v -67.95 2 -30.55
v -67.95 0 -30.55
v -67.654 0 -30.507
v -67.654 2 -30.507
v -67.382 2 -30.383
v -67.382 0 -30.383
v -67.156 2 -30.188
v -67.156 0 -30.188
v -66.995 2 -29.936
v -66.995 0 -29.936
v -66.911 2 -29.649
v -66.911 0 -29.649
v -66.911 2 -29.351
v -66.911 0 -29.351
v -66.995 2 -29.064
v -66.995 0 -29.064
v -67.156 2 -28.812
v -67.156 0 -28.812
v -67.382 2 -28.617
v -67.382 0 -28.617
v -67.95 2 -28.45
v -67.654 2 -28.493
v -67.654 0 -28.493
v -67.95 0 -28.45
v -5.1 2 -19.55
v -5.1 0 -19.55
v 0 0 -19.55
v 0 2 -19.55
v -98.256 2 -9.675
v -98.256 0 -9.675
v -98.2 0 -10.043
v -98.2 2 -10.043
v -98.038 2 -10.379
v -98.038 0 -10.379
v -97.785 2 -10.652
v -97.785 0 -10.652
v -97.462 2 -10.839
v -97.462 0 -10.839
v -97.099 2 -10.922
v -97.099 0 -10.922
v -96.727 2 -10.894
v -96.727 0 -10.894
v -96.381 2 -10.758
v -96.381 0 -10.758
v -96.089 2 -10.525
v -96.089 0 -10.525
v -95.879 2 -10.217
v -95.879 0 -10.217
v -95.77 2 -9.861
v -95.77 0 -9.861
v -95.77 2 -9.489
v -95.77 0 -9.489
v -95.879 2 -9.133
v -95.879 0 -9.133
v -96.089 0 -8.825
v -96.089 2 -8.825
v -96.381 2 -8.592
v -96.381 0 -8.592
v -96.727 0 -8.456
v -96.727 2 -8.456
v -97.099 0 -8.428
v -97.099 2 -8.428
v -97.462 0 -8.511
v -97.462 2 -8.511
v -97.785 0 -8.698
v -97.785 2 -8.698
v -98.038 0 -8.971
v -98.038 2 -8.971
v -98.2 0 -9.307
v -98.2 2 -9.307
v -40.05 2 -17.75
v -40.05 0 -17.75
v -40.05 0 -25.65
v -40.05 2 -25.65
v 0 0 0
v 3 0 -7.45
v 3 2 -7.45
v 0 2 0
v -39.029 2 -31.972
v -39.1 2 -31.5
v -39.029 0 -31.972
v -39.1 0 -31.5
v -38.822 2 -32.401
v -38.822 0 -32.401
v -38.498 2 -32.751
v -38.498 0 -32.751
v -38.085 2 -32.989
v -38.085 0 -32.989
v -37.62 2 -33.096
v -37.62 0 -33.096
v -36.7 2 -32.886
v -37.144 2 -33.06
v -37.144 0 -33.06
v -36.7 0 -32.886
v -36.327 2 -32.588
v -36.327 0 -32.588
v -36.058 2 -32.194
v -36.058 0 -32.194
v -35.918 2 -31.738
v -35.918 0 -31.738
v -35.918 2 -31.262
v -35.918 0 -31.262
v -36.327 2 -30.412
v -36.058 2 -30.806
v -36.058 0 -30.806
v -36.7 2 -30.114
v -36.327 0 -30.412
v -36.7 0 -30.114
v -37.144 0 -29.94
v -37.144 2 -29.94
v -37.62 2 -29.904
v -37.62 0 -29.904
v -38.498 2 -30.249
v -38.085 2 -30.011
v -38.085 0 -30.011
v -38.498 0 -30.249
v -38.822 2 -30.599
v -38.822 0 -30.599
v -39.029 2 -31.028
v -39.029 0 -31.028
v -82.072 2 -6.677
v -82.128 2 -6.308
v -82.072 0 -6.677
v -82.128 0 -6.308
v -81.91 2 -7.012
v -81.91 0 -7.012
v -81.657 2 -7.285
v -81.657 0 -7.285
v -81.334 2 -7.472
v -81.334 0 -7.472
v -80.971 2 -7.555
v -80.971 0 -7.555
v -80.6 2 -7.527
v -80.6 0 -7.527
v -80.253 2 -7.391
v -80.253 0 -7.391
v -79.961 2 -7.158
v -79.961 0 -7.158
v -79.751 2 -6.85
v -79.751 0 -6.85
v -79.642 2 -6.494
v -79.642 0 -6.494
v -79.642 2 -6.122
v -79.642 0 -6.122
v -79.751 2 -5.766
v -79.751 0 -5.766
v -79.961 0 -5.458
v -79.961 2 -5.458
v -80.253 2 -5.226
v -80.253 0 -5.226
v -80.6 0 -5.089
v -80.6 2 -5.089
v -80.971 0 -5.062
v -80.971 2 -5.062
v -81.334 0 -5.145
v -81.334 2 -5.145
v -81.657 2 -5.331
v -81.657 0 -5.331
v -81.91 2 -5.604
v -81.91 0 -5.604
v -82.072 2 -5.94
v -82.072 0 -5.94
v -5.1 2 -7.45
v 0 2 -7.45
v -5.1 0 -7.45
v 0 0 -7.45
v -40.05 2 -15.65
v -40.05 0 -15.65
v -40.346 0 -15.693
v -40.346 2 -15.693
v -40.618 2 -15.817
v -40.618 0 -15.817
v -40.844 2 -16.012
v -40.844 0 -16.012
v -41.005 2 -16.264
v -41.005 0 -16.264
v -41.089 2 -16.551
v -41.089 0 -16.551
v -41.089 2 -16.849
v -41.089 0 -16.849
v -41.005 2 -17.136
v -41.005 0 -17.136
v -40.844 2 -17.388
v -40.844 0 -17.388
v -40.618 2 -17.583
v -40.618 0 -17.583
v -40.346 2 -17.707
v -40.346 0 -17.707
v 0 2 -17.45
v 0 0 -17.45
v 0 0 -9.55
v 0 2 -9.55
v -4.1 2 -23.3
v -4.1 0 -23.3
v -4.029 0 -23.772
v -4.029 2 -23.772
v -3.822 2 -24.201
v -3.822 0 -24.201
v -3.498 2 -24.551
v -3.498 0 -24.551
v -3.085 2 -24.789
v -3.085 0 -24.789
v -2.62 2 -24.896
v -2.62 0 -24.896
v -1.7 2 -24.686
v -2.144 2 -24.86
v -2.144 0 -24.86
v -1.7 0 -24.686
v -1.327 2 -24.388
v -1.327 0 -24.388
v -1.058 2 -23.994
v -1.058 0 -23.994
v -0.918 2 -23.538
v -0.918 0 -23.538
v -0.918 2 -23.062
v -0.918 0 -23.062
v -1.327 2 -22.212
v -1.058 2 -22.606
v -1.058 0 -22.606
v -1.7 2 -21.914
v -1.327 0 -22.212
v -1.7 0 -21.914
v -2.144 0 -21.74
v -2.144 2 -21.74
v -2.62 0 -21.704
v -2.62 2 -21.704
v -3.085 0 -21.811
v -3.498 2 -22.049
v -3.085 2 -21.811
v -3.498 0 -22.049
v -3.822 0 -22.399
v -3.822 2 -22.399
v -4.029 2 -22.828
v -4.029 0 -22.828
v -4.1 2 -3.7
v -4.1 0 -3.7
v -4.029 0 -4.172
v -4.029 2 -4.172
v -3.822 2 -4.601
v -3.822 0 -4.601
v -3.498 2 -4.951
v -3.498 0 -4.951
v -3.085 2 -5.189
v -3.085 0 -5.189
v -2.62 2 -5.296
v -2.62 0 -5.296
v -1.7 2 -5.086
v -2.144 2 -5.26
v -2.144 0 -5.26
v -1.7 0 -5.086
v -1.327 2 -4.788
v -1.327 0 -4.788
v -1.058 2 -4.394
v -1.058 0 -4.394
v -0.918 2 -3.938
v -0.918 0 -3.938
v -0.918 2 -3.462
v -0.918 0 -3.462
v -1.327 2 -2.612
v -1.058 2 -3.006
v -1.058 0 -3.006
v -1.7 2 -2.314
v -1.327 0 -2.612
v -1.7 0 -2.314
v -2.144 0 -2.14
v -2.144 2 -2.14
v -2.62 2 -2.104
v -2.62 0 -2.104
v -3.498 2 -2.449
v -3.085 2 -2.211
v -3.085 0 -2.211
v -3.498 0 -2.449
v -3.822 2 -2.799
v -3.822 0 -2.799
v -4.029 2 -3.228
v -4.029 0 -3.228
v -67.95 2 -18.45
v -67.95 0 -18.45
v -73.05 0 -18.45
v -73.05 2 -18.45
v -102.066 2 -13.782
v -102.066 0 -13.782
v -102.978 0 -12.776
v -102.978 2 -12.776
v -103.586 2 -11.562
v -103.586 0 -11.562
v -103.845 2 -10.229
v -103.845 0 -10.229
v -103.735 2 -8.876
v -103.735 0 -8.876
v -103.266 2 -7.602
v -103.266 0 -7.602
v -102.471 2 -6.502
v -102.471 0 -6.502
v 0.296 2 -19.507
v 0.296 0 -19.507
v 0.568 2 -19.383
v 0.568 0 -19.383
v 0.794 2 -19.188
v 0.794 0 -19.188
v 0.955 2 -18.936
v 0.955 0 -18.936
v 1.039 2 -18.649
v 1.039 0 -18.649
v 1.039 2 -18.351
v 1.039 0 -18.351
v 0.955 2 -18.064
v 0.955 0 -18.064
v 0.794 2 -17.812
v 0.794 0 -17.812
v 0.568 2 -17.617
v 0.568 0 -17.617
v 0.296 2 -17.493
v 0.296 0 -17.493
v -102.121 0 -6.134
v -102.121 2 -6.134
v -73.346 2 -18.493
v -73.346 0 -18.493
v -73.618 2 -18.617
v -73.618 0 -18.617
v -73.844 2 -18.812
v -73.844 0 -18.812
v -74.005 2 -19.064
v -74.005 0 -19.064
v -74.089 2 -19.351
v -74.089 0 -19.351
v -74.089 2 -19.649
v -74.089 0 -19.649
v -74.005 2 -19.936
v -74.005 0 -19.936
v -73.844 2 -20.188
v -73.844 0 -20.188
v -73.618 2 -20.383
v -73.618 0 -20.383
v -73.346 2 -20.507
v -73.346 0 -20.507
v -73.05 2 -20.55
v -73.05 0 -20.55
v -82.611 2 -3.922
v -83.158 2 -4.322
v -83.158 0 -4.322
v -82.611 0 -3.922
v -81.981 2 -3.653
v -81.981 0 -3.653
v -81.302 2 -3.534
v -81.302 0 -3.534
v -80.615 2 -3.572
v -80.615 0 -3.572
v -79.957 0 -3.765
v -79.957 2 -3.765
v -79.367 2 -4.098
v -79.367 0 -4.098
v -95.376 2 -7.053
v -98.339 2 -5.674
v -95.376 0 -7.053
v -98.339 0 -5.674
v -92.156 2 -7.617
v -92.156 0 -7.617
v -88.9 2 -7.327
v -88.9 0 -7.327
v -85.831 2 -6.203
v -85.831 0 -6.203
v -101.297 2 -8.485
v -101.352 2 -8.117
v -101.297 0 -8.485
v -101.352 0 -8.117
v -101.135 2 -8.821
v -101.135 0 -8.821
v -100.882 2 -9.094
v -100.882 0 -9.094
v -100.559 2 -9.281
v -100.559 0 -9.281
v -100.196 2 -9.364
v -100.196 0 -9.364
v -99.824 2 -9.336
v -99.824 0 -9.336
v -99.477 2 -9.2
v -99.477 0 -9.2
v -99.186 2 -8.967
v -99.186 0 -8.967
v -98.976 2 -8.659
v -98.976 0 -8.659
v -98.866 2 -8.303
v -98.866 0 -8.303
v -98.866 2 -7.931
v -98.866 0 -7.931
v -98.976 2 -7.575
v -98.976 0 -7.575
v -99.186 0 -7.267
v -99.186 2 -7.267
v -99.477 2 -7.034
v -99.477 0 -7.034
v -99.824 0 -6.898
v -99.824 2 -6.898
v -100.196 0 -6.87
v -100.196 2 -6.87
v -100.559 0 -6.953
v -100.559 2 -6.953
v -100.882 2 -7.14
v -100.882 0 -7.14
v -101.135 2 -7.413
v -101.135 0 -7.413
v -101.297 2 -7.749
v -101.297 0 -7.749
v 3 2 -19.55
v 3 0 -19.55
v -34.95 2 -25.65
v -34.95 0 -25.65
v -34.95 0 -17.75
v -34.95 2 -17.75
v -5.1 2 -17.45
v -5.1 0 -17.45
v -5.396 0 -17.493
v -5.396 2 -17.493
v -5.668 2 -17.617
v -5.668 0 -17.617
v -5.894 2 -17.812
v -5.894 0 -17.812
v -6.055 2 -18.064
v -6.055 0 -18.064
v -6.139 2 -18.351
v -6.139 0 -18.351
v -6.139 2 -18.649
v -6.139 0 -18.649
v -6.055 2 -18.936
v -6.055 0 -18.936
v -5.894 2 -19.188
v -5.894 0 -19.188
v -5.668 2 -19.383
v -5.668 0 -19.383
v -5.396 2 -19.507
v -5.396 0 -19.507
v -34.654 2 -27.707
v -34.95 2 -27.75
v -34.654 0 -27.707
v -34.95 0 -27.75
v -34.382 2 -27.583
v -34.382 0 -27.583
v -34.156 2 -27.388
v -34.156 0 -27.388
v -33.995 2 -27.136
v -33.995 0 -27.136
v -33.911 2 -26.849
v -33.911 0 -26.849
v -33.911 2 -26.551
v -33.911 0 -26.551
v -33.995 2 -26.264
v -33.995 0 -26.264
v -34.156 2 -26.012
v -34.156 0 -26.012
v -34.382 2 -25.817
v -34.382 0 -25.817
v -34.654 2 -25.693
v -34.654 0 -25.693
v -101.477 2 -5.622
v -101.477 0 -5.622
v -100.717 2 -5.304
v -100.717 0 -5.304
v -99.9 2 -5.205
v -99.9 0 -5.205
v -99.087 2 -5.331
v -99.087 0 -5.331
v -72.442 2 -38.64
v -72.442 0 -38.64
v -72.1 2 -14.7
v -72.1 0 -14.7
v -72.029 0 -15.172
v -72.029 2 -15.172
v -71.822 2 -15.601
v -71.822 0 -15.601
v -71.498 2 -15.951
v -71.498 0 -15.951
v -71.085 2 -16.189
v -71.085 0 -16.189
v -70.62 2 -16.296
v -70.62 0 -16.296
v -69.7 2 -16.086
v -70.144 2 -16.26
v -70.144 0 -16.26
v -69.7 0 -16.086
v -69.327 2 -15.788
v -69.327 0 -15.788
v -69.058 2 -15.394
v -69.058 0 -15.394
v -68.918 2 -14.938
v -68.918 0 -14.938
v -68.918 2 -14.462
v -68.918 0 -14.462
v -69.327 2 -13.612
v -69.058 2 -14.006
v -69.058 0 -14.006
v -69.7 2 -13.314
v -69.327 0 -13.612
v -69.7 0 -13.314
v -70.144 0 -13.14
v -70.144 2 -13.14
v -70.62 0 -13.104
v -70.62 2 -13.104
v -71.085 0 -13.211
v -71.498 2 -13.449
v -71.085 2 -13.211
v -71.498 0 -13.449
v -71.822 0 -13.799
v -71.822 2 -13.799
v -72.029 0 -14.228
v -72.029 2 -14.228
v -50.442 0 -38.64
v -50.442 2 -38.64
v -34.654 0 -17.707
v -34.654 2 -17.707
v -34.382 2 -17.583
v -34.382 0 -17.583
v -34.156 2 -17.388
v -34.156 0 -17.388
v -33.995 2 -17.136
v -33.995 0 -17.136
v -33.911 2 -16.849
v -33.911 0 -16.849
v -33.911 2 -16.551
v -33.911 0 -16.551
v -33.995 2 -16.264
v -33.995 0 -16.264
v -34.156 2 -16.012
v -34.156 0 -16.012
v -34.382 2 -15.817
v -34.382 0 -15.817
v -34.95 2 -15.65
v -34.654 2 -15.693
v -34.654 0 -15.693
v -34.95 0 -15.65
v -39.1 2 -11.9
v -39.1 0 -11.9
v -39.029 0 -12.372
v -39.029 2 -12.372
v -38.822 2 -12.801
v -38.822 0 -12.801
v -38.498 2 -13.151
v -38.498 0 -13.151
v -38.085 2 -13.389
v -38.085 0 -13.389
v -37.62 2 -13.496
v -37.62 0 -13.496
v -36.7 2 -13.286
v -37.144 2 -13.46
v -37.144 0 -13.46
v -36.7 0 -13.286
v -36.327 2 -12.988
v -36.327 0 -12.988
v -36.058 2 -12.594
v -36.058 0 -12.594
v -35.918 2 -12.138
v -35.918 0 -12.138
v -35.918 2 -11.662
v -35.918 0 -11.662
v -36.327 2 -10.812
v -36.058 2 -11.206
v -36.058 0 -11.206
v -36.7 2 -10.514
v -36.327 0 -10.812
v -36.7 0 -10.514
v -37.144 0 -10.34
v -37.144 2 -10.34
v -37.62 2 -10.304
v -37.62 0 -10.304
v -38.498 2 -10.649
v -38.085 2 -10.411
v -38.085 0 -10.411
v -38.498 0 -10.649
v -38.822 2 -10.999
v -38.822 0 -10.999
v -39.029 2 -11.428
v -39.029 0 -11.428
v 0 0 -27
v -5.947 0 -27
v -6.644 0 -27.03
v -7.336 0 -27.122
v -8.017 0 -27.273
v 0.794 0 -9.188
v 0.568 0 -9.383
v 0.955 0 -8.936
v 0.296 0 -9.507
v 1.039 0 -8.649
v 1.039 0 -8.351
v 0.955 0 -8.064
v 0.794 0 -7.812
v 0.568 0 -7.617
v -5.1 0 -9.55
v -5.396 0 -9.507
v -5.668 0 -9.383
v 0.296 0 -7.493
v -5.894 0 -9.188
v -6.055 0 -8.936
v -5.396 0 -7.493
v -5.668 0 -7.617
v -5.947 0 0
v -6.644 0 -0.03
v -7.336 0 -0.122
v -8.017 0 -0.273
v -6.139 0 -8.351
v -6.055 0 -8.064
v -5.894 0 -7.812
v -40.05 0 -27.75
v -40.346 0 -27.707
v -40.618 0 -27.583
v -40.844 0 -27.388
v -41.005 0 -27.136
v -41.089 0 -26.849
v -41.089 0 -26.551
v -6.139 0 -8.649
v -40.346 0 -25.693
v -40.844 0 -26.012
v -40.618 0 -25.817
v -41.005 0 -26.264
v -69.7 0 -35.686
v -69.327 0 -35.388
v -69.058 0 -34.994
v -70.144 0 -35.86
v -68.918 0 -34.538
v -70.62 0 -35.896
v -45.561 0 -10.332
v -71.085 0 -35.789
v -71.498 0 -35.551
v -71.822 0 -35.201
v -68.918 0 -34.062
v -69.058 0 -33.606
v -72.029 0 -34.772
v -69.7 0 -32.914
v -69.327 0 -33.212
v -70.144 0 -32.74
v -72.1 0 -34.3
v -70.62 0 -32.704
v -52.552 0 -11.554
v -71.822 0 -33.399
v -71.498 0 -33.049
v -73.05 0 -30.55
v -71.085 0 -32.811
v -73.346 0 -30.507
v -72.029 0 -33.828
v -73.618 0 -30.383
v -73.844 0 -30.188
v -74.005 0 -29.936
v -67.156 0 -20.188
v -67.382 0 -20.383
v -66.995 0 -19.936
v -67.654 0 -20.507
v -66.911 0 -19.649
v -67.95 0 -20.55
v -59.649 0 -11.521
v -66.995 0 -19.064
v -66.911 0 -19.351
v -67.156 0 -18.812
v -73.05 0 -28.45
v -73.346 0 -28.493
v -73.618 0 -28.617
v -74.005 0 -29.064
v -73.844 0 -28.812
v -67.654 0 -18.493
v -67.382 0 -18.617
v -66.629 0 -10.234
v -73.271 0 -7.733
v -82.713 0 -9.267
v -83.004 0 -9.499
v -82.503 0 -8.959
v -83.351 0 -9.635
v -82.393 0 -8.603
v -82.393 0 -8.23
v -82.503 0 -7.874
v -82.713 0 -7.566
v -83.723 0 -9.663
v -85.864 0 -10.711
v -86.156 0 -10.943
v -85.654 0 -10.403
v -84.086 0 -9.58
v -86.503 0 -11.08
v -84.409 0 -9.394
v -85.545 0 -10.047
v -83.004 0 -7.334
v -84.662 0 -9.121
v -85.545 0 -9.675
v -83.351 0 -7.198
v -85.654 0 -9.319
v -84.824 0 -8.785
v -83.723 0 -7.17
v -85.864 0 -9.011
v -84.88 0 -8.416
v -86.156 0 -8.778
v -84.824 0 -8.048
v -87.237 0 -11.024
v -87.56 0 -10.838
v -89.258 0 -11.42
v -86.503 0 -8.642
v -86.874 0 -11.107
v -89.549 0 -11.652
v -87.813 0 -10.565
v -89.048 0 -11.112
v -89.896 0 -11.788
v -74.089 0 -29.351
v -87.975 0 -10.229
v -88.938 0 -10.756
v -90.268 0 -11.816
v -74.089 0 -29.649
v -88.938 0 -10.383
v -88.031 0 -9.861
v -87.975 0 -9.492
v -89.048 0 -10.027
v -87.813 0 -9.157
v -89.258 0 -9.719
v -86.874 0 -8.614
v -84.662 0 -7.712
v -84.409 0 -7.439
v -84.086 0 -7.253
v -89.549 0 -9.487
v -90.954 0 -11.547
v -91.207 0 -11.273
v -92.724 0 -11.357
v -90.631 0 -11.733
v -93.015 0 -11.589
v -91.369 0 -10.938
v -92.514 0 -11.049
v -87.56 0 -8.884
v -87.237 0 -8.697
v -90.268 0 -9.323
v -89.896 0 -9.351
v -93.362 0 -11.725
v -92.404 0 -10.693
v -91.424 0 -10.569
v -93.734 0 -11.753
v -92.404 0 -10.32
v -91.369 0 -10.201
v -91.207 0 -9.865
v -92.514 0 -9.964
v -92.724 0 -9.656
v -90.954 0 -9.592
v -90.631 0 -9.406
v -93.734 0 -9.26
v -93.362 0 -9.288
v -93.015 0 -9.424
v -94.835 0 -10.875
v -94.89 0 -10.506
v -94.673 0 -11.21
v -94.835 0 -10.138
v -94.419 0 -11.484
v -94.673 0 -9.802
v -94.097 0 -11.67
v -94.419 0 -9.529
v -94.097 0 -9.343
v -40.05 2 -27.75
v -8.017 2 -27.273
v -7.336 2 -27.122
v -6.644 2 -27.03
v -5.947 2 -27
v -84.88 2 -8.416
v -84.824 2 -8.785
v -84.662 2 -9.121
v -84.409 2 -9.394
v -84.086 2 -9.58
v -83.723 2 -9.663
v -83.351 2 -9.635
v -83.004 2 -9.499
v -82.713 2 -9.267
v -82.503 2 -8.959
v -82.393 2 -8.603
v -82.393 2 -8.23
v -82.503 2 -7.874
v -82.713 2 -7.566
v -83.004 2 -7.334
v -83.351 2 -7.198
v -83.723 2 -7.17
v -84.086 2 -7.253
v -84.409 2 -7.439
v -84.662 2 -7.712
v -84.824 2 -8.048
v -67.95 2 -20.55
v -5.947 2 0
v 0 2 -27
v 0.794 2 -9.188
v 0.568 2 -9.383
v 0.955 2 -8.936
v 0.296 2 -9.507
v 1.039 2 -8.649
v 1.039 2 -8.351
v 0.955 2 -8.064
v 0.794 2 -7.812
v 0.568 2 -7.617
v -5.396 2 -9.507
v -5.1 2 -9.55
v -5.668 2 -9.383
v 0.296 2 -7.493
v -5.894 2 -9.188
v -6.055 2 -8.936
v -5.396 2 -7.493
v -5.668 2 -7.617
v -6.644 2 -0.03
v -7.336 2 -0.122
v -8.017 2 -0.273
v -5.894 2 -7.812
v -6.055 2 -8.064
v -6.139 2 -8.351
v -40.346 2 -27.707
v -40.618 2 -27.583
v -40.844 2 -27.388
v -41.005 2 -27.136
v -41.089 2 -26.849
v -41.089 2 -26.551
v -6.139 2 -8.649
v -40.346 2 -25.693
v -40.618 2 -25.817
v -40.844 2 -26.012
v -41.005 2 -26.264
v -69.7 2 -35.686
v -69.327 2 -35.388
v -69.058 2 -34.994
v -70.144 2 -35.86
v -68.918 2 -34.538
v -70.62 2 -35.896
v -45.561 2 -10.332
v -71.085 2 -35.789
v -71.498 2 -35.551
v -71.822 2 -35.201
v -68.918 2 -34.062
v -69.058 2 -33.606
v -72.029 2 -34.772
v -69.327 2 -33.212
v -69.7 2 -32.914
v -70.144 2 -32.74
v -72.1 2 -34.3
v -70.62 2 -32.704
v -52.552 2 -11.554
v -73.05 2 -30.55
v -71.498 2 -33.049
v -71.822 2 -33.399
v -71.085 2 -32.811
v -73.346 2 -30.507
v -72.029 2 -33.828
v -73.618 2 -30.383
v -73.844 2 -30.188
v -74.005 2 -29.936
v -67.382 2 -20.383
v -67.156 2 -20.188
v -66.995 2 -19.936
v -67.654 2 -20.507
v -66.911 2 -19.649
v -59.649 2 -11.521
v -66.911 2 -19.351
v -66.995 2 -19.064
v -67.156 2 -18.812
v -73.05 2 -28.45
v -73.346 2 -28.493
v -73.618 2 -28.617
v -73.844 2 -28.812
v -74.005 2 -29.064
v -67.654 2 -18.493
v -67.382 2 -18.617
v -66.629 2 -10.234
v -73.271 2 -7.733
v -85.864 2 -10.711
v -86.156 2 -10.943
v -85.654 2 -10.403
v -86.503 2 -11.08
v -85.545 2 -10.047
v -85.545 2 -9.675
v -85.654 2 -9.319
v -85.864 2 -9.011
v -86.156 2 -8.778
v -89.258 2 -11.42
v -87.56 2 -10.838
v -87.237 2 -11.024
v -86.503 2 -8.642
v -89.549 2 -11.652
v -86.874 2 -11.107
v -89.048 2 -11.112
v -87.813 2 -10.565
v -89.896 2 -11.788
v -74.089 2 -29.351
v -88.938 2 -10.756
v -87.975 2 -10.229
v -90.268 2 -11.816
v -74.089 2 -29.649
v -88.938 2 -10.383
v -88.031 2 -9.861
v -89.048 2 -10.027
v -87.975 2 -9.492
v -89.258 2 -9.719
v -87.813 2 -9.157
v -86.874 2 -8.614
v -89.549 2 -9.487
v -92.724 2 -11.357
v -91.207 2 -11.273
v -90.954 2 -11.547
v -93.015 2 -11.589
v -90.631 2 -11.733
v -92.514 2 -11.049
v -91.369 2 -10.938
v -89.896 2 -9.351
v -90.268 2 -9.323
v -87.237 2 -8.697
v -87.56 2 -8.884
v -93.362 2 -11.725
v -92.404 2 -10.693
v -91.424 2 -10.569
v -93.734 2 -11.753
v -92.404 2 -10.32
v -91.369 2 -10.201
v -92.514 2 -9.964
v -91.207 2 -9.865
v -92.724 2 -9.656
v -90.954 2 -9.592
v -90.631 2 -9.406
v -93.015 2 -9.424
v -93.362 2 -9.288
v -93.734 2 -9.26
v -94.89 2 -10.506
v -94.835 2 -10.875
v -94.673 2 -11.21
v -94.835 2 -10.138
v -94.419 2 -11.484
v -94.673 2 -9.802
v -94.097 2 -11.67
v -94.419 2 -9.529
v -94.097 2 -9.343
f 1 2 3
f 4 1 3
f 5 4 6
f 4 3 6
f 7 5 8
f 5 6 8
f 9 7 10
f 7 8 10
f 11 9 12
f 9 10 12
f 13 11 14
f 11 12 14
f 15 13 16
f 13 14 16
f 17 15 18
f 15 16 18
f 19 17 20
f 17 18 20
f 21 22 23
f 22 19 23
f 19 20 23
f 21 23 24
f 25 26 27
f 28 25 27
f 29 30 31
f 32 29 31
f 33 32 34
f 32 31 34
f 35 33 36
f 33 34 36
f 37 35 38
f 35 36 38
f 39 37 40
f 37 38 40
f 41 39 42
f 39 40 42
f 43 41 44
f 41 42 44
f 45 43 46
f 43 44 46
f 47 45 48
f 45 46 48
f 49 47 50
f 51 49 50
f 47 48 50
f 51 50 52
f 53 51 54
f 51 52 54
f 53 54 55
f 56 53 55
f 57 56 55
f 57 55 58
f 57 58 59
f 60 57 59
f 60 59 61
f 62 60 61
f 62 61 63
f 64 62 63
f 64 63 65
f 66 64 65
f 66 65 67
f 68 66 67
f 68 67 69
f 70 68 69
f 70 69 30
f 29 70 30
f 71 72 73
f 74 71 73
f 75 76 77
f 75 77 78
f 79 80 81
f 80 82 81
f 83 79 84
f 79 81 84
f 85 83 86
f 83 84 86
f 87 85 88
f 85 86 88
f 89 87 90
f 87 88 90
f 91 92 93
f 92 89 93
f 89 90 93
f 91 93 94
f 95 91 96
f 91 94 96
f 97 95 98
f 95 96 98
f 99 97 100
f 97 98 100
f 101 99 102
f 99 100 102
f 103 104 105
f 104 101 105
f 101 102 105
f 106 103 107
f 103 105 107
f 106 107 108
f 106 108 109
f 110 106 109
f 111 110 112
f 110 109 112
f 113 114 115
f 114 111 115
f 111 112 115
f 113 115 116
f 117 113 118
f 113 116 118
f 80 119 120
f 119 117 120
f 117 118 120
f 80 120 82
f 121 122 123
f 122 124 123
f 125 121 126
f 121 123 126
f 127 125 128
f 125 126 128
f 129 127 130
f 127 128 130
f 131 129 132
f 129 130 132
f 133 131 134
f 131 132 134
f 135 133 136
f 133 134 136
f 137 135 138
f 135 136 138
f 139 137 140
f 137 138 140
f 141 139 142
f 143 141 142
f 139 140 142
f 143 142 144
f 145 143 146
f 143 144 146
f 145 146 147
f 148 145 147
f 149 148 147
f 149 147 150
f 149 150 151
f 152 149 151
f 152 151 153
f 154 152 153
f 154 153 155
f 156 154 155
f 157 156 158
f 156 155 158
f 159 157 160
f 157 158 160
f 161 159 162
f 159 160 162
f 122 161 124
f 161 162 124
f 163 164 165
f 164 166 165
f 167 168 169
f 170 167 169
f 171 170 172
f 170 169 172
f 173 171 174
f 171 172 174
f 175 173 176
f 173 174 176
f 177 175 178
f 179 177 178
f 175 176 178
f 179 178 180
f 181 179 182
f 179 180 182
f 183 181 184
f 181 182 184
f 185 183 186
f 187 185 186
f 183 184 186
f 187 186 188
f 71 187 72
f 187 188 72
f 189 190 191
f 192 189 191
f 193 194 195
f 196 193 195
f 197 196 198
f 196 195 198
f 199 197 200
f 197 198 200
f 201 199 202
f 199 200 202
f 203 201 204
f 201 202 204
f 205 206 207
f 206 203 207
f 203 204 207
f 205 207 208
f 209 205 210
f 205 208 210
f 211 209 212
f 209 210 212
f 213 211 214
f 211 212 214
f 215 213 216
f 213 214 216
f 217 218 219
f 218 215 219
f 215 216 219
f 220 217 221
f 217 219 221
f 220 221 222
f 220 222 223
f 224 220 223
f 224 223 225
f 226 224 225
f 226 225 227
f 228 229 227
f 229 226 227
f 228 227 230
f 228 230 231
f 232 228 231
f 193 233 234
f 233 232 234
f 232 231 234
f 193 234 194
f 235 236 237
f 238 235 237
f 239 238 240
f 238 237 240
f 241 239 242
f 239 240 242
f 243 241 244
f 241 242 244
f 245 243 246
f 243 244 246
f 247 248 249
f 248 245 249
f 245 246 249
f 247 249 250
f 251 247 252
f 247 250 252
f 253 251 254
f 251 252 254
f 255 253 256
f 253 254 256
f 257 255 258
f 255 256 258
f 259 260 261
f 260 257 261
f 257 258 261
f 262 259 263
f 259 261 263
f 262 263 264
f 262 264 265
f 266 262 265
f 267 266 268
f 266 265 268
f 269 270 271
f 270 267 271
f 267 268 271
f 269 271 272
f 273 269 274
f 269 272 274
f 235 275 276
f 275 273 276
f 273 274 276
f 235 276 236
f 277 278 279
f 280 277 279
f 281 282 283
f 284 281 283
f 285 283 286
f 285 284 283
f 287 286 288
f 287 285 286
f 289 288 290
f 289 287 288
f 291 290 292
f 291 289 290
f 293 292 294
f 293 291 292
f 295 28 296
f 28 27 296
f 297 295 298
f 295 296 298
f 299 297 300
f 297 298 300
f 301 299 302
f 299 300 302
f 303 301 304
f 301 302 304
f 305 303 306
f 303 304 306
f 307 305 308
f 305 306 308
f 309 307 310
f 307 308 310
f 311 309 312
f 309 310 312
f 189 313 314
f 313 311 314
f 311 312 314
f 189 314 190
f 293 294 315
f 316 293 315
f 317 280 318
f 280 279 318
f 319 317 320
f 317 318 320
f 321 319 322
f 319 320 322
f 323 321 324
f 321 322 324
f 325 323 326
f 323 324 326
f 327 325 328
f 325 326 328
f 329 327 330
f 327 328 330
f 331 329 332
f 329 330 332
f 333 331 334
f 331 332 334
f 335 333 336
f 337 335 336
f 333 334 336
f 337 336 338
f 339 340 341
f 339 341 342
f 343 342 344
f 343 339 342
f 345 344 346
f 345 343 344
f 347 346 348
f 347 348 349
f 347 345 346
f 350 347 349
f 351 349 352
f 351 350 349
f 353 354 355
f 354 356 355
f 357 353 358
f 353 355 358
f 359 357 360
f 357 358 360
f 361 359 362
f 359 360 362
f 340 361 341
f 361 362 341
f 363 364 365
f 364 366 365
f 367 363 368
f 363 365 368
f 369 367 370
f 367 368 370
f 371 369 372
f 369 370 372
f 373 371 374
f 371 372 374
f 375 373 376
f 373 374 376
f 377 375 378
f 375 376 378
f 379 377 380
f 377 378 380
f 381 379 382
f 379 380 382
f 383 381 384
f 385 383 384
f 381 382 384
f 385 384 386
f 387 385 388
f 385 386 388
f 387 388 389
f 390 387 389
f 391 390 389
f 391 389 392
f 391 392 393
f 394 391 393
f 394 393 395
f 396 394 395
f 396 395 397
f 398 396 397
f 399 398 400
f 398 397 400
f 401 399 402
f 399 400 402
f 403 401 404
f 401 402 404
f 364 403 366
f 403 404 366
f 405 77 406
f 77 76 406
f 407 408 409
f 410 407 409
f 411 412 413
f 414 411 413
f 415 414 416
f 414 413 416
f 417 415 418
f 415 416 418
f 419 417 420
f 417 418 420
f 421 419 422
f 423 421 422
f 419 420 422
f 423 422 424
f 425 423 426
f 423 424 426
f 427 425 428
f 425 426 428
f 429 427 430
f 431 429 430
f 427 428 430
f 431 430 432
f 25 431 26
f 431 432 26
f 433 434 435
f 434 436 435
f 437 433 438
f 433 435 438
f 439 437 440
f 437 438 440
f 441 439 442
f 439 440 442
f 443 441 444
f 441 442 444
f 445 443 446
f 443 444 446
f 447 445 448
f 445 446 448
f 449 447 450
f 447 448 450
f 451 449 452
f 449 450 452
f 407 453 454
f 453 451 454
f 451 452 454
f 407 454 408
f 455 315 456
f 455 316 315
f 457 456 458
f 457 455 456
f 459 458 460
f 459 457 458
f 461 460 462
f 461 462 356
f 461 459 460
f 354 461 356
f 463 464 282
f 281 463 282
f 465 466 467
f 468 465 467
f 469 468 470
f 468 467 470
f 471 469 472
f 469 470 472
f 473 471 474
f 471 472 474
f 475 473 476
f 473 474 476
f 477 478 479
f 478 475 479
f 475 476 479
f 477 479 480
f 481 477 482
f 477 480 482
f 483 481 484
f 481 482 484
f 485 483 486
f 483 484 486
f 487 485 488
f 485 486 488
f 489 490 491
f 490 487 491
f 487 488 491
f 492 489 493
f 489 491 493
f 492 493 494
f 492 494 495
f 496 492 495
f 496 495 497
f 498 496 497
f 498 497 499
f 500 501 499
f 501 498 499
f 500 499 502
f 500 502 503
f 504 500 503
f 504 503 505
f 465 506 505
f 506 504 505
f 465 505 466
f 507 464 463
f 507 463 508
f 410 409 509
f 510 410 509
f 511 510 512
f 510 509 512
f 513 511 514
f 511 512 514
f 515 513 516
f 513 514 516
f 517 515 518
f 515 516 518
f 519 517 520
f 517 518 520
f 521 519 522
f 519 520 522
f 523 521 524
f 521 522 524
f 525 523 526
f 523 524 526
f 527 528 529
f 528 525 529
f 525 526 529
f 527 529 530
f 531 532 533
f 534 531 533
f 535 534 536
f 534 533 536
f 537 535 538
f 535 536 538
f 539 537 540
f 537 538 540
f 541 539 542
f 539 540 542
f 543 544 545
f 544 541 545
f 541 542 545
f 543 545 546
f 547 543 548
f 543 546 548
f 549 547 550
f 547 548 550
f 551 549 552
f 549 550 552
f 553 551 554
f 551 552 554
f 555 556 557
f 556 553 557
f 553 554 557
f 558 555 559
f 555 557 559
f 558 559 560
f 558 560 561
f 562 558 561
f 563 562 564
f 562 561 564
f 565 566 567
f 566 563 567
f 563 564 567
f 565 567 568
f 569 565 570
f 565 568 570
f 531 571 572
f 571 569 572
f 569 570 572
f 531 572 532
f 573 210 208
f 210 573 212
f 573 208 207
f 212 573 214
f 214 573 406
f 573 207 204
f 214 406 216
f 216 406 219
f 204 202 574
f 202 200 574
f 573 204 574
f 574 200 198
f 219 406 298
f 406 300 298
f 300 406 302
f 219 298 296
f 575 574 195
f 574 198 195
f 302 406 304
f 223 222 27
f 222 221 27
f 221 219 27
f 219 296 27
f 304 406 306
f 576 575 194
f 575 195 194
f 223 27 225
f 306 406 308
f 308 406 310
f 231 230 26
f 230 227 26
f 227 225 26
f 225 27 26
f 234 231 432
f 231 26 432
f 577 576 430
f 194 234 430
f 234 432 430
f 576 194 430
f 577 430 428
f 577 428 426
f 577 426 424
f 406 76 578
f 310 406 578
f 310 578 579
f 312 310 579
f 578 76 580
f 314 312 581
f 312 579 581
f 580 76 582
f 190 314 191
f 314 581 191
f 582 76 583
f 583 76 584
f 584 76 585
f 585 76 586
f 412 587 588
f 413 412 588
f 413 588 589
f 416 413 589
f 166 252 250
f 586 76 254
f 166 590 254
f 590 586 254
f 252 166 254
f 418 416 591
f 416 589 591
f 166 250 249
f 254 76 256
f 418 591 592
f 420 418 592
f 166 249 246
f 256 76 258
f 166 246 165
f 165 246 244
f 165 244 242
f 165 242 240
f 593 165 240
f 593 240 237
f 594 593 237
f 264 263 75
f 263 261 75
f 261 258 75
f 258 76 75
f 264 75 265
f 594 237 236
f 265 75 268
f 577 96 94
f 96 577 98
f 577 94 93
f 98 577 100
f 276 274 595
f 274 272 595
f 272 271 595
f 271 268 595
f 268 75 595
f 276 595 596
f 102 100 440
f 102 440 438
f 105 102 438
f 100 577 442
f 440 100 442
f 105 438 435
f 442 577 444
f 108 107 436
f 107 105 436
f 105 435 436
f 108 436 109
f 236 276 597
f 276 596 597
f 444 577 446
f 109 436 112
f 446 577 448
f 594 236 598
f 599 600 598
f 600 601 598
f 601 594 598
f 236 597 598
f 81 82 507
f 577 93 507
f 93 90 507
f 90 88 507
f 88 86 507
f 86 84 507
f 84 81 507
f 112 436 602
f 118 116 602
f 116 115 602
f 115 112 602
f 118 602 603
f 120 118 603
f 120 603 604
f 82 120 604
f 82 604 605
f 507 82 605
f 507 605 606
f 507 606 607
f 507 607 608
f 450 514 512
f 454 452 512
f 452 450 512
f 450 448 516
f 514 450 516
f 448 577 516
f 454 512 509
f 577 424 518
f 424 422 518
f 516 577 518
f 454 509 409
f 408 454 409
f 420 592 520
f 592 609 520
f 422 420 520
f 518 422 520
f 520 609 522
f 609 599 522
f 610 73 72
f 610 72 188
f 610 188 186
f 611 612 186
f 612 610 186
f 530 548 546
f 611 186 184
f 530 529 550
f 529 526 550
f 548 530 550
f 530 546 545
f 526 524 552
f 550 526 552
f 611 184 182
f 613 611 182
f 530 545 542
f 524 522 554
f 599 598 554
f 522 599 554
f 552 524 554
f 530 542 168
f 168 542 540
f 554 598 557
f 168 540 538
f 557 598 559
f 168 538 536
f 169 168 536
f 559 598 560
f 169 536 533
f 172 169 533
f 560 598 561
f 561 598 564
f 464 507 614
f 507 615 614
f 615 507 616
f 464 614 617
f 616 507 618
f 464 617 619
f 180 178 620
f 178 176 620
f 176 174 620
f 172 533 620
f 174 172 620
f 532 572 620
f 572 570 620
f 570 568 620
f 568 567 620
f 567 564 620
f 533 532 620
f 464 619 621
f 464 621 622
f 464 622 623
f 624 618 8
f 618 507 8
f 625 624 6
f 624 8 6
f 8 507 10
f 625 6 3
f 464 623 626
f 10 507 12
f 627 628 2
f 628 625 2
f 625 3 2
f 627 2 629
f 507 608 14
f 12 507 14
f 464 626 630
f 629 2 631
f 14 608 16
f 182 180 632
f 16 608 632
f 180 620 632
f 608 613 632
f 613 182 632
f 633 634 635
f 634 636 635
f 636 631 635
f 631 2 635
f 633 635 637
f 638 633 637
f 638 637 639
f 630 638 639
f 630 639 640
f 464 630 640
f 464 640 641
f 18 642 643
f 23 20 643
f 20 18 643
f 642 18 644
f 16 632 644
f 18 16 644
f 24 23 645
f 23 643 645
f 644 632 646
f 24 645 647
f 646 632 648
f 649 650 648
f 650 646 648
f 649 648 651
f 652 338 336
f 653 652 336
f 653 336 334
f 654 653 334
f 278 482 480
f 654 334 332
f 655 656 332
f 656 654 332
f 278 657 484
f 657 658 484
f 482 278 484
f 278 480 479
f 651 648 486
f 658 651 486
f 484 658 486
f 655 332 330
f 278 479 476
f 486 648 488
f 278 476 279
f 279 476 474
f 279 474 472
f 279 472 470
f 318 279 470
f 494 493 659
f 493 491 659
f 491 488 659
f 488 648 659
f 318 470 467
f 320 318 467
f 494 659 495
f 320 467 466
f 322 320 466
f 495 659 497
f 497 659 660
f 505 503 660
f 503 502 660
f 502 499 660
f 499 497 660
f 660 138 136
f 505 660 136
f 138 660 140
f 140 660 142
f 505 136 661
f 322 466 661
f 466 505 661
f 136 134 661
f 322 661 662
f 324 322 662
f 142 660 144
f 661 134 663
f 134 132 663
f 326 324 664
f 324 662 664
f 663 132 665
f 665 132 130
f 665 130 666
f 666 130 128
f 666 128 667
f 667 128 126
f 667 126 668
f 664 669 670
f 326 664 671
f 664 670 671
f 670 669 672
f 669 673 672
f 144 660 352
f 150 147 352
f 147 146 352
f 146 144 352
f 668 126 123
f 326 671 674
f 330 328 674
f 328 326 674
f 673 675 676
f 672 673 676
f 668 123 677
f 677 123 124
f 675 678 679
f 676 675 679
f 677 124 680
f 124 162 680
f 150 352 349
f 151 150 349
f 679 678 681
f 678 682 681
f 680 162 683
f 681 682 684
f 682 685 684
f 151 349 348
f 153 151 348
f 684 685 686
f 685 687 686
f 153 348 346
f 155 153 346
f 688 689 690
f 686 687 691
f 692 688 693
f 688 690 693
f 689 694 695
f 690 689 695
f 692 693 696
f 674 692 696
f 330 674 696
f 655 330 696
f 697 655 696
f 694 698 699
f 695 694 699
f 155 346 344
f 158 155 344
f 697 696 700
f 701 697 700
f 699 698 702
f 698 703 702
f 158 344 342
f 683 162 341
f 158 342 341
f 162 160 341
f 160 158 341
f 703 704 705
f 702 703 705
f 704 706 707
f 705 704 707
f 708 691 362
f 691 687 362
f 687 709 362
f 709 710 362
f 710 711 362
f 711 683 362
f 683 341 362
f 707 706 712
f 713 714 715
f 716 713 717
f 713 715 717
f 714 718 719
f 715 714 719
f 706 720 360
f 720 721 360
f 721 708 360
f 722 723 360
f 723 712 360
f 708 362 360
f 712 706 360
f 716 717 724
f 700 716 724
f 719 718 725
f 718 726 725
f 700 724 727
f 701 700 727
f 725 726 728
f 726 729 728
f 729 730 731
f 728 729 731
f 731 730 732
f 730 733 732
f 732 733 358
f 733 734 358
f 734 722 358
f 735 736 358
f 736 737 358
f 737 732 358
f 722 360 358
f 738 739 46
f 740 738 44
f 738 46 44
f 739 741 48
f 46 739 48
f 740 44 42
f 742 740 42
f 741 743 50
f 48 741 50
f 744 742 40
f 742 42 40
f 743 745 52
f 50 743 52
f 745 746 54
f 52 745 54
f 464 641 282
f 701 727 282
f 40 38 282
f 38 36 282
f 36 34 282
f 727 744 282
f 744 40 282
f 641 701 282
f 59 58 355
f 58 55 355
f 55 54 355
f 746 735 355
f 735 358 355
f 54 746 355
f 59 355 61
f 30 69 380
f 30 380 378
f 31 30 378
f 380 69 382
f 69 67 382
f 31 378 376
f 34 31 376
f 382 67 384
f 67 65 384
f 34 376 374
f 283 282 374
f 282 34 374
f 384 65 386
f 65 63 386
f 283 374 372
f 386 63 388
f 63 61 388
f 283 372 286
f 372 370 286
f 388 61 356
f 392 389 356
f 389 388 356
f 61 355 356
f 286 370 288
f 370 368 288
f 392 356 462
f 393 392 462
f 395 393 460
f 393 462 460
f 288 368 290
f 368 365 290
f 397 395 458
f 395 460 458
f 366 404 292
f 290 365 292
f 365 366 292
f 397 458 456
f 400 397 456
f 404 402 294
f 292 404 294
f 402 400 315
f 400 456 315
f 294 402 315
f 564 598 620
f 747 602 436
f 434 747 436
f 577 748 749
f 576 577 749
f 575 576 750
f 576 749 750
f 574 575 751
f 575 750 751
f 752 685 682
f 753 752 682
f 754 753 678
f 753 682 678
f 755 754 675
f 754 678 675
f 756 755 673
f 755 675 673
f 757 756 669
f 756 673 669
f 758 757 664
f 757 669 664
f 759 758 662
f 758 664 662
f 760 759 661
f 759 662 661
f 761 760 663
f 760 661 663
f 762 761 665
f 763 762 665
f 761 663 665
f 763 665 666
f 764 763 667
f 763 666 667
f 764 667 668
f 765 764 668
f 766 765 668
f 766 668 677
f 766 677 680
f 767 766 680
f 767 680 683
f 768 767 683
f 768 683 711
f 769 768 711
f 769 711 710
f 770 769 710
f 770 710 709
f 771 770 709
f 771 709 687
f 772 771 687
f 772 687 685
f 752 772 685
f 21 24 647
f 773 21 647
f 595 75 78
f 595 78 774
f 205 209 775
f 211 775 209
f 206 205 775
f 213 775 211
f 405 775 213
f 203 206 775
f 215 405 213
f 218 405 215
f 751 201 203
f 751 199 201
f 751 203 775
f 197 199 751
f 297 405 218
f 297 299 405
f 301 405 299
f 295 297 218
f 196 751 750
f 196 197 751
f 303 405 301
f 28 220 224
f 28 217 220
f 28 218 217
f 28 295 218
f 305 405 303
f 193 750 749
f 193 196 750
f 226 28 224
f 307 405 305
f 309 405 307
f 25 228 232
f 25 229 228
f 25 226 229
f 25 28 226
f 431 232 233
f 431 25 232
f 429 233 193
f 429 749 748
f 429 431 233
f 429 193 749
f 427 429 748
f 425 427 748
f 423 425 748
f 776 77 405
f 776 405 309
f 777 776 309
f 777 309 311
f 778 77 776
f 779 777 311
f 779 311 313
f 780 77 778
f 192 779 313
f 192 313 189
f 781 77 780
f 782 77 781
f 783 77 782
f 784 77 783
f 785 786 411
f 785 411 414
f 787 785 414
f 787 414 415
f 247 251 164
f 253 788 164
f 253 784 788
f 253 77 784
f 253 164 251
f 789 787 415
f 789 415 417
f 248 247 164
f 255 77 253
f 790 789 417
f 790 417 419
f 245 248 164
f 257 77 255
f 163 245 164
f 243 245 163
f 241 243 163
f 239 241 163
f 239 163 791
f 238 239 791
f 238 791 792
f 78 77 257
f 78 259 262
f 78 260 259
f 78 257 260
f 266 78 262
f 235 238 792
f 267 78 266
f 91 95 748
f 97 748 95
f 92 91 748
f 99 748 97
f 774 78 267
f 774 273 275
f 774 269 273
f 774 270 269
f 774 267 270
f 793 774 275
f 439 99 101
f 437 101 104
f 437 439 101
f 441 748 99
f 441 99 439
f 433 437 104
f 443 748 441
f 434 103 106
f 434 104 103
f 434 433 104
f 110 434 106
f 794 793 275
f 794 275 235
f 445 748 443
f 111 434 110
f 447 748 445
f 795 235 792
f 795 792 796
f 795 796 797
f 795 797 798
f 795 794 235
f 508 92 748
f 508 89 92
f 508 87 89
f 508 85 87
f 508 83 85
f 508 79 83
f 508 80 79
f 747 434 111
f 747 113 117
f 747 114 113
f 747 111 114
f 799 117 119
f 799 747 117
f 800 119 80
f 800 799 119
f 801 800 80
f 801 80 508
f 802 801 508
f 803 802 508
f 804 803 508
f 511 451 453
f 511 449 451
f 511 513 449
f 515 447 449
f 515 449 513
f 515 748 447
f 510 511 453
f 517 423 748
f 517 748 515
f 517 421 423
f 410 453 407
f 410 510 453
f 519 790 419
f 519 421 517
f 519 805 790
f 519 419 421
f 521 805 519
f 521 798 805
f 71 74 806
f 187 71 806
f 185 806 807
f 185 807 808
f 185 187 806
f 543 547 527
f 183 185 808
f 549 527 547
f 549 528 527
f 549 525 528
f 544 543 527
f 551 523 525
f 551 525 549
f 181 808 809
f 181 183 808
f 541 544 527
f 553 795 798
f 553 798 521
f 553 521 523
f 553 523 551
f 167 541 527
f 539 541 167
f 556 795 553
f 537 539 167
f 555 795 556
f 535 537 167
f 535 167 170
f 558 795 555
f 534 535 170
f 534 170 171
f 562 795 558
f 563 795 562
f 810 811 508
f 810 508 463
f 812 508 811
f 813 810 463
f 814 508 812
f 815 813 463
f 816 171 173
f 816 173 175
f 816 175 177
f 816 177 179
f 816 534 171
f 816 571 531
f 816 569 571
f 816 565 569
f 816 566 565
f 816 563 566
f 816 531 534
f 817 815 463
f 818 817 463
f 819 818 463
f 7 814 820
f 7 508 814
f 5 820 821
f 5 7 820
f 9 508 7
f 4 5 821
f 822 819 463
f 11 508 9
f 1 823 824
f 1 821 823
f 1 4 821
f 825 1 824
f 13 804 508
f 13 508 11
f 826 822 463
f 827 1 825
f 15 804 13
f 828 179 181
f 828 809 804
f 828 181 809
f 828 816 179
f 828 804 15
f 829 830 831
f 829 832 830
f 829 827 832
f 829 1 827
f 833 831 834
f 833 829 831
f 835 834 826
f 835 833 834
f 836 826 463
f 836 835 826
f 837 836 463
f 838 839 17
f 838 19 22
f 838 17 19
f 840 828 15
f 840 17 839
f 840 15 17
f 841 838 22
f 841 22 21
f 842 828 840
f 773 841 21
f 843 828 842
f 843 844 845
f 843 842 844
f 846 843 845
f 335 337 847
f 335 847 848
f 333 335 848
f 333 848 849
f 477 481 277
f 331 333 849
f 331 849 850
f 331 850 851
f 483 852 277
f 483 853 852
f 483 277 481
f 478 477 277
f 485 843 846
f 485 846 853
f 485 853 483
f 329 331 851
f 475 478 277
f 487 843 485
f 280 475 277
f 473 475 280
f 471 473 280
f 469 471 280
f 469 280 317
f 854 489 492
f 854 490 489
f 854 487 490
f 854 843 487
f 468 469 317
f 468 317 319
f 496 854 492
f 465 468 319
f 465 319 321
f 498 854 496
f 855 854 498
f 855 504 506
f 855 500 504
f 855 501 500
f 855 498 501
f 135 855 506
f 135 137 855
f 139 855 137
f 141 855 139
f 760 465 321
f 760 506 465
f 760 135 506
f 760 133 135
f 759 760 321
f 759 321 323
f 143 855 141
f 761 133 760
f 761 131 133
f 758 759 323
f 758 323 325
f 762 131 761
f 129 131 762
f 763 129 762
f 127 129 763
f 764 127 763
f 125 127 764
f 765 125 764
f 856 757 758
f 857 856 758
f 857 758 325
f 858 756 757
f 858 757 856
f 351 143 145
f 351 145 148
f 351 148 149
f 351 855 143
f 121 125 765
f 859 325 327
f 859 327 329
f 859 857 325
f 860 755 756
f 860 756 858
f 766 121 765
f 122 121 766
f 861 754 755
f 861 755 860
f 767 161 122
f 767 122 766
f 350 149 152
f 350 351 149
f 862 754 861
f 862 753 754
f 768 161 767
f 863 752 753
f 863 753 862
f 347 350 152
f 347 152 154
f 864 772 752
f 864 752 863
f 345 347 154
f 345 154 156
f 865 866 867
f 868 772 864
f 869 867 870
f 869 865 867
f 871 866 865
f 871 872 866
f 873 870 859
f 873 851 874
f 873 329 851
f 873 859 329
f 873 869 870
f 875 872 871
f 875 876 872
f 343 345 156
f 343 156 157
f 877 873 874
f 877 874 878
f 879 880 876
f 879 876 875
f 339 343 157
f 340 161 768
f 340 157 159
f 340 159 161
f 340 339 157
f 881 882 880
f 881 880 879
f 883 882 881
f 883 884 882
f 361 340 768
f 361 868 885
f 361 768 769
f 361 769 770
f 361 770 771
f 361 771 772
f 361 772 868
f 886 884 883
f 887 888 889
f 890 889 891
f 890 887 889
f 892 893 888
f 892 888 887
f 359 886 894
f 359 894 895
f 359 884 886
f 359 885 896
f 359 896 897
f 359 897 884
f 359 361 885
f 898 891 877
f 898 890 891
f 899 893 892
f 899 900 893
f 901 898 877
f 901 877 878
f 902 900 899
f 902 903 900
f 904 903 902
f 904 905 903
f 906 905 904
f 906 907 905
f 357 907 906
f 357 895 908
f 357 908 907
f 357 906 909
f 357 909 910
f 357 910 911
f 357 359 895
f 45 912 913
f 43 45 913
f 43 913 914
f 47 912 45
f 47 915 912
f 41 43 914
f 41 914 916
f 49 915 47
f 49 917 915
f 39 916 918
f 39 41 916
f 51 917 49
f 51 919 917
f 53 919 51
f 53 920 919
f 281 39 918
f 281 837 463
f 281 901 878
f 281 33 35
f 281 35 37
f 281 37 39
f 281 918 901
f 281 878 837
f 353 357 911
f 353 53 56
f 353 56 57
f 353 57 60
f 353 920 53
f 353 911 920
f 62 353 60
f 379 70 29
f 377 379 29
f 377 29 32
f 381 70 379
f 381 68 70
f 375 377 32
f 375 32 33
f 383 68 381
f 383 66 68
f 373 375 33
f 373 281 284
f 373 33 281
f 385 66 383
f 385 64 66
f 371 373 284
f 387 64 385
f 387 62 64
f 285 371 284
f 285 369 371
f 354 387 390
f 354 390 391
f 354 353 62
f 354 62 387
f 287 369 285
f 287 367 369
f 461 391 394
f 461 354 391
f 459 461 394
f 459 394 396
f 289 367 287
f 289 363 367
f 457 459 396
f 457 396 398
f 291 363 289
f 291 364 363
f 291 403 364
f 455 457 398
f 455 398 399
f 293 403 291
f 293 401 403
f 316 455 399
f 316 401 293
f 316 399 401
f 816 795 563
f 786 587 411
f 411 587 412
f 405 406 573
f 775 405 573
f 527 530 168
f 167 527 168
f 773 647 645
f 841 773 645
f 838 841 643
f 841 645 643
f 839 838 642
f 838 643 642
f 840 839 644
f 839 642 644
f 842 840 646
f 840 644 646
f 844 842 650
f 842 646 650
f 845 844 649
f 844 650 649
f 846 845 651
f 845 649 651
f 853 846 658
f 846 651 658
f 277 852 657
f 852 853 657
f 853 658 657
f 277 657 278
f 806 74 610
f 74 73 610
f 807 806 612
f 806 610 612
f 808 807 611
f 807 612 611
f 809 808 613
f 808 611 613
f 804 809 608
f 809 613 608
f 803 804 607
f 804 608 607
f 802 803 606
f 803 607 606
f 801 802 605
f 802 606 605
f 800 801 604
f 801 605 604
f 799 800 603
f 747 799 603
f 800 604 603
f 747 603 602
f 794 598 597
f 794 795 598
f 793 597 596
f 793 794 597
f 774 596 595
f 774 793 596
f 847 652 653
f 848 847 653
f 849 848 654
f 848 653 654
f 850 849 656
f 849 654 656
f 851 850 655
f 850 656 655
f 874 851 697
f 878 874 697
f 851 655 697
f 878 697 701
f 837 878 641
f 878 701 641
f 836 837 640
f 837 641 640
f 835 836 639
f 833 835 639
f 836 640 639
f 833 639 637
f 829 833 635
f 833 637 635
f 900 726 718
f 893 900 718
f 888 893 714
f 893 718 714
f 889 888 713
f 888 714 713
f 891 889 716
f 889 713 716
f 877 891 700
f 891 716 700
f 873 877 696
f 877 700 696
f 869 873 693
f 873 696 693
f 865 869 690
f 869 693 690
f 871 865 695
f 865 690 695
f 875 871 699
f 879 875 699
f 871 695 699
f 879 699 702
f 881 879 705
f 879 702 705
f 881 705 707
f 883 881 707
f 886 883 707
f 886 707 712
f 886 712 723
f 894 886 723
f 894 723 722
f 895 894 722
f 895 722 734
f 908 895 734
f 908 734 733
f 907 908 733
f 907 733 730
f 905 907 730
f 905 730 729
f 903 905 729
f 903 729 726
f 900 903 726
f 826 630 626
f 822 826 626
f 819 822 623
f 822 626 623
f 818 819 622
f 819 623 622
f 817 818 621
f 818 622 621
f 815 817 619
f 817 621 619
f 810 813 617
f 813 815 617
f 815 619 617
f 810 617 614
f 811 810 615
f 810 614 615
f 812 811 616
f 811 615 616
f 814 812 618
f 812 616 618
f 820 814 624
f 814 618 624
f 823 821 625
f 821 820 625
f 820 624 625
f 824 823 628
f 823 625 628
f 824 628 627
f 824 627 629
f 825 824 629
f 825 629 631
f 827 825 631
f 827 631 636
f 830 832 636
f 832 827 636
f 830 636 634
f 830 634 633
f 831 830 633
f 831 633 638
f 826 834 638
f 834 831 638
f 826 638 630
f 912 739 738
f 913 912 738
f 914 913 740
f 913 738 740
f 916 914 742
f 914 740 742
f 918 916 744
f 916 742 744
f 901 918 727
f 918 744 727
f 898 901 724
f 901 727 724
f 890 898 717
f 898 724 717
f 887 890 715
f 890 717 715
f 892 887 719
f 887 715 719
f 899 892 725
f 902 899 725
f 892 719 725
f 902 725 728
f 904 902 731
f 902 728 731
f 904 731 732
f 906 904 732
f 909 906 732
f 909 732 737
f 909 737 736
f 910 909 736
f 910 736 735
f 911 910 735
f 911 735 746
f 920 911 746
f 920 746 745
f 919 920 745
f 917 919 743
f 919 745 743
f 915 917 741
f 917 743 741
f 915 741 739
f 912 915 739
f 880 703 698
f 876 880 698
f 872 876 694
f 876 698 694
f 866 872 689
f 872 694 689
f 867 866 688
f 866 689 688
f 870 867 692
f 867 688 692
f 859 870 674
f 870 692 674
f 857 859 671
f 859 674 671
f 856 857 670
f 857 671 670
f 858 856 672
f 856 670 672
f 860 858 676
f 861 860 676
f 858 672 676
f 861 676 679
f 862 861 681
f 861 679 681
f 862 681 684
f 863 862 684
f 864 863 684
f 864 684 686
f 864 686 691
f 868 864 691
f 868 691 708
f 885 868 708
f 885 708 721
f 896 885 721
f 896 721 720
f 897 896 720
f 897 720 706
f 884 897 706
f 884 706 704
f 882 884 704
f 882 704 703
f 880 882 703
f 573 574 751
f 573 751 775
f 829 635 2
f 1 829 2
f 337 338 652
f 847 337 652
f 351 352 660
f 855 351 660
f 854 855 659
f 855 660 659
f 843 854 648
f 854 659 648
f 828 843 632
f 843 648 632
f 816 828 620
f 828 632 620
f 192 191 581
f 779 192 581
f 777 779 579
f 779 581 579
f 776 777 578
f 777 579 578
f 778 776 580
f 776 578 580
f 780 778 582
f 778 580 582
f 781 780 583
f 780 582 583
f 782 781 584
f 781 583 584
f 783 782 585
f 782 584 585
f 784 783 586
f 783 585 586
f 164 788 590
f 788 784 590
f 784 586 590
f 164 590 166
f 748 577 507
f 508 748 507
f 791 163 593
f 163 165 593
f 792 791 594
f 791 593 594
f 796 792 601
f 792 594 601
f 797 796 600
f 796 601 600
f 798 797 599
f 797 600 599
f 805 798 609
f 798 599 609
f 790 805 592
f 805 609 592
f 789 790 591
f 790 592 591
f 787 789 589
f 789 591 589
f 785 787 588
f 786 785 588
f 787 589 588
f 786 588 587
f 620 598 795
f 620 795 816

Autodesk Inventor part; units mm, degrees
ref_plane "YZ Plane" through (0, 0, 0) normal (1, 0, 0) x (0, 1, 0)
ref_plane "XZ Plane" through (0, 0, 0) normal (0, 1, 0) x (-1, 0, 0)
ref_plane "XY Plane" through (0, 0, 0) normal (0, 0, 1) x (1, 0, 0)
sketch "スケッチ1" plane through (0, 0, 0) normal (0, 1, 0) x (-1, 0, 0)
  line L0 (0, 0) -> (7, 0)
  line L1 (7, 0) -> (7, -27) construction
  line L2 (7, -27) -> (0, -27)
  line L3 (0, -27) -> (0, 0) construction
  circle A0 centre (2.5, -3.7) radius 1.6
  circle A1 centre (2.5, -23.3) radius 1.6
  line L4 (5.05, -7.5) -> (0.05, -7.5) construction
  line L5 (0.05, -7.5) -> (0.05, -19.5) construction
  line L6 (0.05, -19.5) -> (5.05, -19.5) construction
  line L7 (5.05, -19.5) -> (5.05, -7.5) construction
  line L8 (0, -7.45) -> (5.1, -7.45)
  line L9 (5.1, -7.45) -> (5.1, -19.55)
  line L10 (5.1, -19.55) -> (0, -19.55)
  line L11 (0, -19.55) -> (0, -7.45)
  line L12 (84.5459, 21.5815) -> (61.9185, -1.0459) construction
  line L13 (61.9185, -1.0459) -> (65.4541, -4.5815) construction
  line L14 (65.4541, -4.5815) -> (88.0815, 18.0459) construction
  line L15 (88.0815, 18.0459) -> (84.5459, 21.5815) construction
  line L16 (70.3953, 0.3598) -> (83.1317, 13.0962)
  circle A2 centre (100.1023, -8.117) radius 1.25
  line L17 (7, 0) -> (45.561, -10.3324)
  line L18 (7, -27) -> (50.4418, -38.6402)
  line L19 (72.4418, -38.6402) -> (106.1477, -10.3575)
  line L20 (106.1477, -10.3575) -> (100.2529, -4.1751)
  arc A3 (45.561, -10.3324) -> (81.4937, -2.447) centre (55.9138, 28.3046) ccw
  line L21 (72.4418, -38.6402) -> (50.4418, -38.6402)
  line L22 (40, -9.2) -> (35, -9.2) construction
  line L23 (35, -9.2) -> (35, -34.2) construction
  line L24 (35, -34.2) -> (40, -34.2) construction
  line L25 (40, -34.2) -> (40, -9.2) construction
  circle A4 centre (97.0056, -9.675) radius 1.25
  circle A5 centre (93.6401, -10.5063) radius 1.25
  circle A6 centre (90.1742, -10.5693) radius 1.25
  circle A7 centre (86.7807, -9.8609) radius 1.25
  circle A8 centre (83.6295, -8.4164) radius 1.25
  circle A9 centre (80.8777, -6.3081) radius 1.25
  line L26 (100.2529, -4.1751) -> (104.1748, -8.2883)
  arc A10 (81.4937, -2.447) -> (100.2529, -4.1751) centre (91.6271, 4.8718) ccw
  line L27 (40, -15.7) -> (35, -15.7) construction
  line L28 (35, -15.7) -> (35, -27.7) construction
  line L29 (35, -27.7) -> (40, -27.7) construction
  line L30 (40, -27.7) -> (40, -15.7) construction
  line L31 (34.95, -15.65) -> (40.05, -15.65)
  line L32 (40.05, -15.65) -> (40.05, -27.75)
  line L33 (40.05, -27.75) -> (34.95, -27.75)
  line L34 (34.95, -27.75) -> (34.95, -15.65)
  circle A11 centre (37.5, -11.9) radius 1.6
  circle A12 centre (37.5, -31.5) radius 1.6
  line L35 (73, -12) -> (68, -12) construction
  line L36 (68, -12) -> (68, -37) construction
  line L37 (68, -37) -> (73, -37) construction
  line L38 (73, -37) -> (73, -12) construction
  line L39 (73, -18.5) -> (68, -18.5) construction
  line L40 (68, -18.5) -> (68, -30.5) construction
  line L41 (68, -30.5) -> (73, -30.5) construction
  line L42 (73, -30.5) -> (73, -18.5) construction
  line L43 (67.95, -18.45) -> (73.05, -18.45)
  line L44 (73.05, -18.45) -> (73.05, -30.55)
  line L45 (73.05, -30.55) -> (67.95, -30.55)
  line L46 (67.95, -30.55) -> (67.95, -18.45)
  circle A13 centre (70.5, -14.7) radius 1.6
  circle A14 centre (70.5, -34.3) radius 1.6
  circle A15 centre (73.05, -19.5) radius 1.05
  circle A16 centre (67.95, -19.5) radius 1.05
  circle A17 centre (67.95, -29.5) radius 1.05
  circle A18 centre (73.05, -29.5) radius 1.05
  circle A19 centre (40.05, -16.7) radius 1.05
  circle A20 centre (34.95, -16.7) radius 1.05
  circle A21 centre (34.95, -26.7) radius 1.05
  circle A22 centre (40.05, -26.7) radius 1.05
  circle A23 centre (5.1, -8.5) radius 1.05
  circle A24 centre (0, -8.5) radius 1.05
  circle A25 centre (0, -18.5) radius 1.05
  circle A26 centre (5.1, -18.5) radius 1.05
  line L47 (-3, -7.45) -> (-3, -19.55)
  line L48 (-3, -19.55) -> (0, -27)
  line L49 (-3, -7.45) -> (0, 0)
  circle A27 centre (91.6271, 4.8718) radius 15.5
  point P0 (75, 8.5)
  point P1 (91.6085, -20.8534)
  point P2 (82.042, -3.1517)
  point P3 (81.2596, -2.6403)
  point P4 (55.561, -0.3324)
  point P5 (40, -14.6)
  point P6 (35, -14.6)
  point P7 (40, -28.8)
  point P8 (35, -28.8)
  dimension "d0" = 7
  dimension "d1" = 27
  dimension "d2" = 3.2
  dimension "d3" = 3.2
  dimension "d4" = 5
  dimension "d5" = 12
  dimension "d6" = 2.5
  dimension "d7" = 2.5
  dimension "d8" = 19.6
  dimension "d9" = 3.7
  dimension "d11" = 7.5
  dimension "d12" = 0.05
  dimension "d20" = 32
  dimension "d21" = 5
  dimension "d22" = 45
  dimension "d23" = 2.5
  dimension "d24" = 16
  dimension "d25" = 75
  dimension "d26" = 8.5
  dimension "d27" = 30
  dimension "d33" = 27
  dimension "d35" = 2.5
  dimension "d44" = 75
  dimension "d49" = 75
  dimension "d52" = 40
  dimension "d53" = 30
  dimension "d56" = 39
  dimension "d61" = 5
  dimension "d62" = 25
  dimension "d63" = 33
  dimension "d64" = 9.2
  dimension "d69" = 77
  dimension "d72" = 22
  dimension "d73" = 12.5
  dimension "d74" = 50
  dimension "d75" = 21
  dimension "d76" = 44
  dimension "d77" = 12
  dimension "d78" = 6.5
  dimension "d79" = 0.05
  dimension "d84" = 3.2
  dimension "d85" = 2.5
  dimension "d86" = 2.7
  dimension "d88" = 3.2
  dimension "d89" = 19.6
  dimension "d90" = 2.5
  dimension "d91" = 5
  dimension "d92" = 25
  dimension "d93" = 12
  dimension "d94" = 6.5
  dimension "d95" = 0.05
  dimension "d100" = 3.2
  dimension "d101" = 2.5
  dimension "d102" = 2.7
  dimension "d104" = 3.2
  dimension "d105" = 19.6
  dimension "d106" = 2.5
  dimension "d107" = 12
  dimension "d109" = 66
  dimension "d118" = 2.1
  dimension "d119" = 2.1
  dimension "d120" = 2.1
  dimension "d121" = 2.1
  dimension "d122" = 2.1
extrude "押し出し2" add sketch "スケッチ1" along normal blind 2 contours L0 L17 A3 A27 A9 A8 A7 A6 A5 A4 A2 L20 L19 L21 L18 L2 L48 L47 L49 | A3 A10 L20 A27 A2 A4 A5 A6 A7 A8 A9
fillet "フィレット1" radius 5 1 edges at (-106.1477, 1, -10.3575)
fillet "フィレット2" radius 3 2 edges at (-81.4937, 1, -2.447) (-100.2529, 1, -4.1751)
fillet "フィレット3" radius 8 2 edges at (-7, 1, -27) (-7, 1, 0)
equation "\"d7\" = d6"
equation "\"d11\" = -0.5 * d5 + 0.5 * d1"
equation "\"d23\" = 0.5 * d21"
equation "\"d24\" = 0.5 * d20"
equation "\"d49\" = d44"
equation "\"d28\" = d20 - 2 * d29"
equation "\"d29\" = 7"
properties part number "頭＿メインフレーム" material "GFRP"
